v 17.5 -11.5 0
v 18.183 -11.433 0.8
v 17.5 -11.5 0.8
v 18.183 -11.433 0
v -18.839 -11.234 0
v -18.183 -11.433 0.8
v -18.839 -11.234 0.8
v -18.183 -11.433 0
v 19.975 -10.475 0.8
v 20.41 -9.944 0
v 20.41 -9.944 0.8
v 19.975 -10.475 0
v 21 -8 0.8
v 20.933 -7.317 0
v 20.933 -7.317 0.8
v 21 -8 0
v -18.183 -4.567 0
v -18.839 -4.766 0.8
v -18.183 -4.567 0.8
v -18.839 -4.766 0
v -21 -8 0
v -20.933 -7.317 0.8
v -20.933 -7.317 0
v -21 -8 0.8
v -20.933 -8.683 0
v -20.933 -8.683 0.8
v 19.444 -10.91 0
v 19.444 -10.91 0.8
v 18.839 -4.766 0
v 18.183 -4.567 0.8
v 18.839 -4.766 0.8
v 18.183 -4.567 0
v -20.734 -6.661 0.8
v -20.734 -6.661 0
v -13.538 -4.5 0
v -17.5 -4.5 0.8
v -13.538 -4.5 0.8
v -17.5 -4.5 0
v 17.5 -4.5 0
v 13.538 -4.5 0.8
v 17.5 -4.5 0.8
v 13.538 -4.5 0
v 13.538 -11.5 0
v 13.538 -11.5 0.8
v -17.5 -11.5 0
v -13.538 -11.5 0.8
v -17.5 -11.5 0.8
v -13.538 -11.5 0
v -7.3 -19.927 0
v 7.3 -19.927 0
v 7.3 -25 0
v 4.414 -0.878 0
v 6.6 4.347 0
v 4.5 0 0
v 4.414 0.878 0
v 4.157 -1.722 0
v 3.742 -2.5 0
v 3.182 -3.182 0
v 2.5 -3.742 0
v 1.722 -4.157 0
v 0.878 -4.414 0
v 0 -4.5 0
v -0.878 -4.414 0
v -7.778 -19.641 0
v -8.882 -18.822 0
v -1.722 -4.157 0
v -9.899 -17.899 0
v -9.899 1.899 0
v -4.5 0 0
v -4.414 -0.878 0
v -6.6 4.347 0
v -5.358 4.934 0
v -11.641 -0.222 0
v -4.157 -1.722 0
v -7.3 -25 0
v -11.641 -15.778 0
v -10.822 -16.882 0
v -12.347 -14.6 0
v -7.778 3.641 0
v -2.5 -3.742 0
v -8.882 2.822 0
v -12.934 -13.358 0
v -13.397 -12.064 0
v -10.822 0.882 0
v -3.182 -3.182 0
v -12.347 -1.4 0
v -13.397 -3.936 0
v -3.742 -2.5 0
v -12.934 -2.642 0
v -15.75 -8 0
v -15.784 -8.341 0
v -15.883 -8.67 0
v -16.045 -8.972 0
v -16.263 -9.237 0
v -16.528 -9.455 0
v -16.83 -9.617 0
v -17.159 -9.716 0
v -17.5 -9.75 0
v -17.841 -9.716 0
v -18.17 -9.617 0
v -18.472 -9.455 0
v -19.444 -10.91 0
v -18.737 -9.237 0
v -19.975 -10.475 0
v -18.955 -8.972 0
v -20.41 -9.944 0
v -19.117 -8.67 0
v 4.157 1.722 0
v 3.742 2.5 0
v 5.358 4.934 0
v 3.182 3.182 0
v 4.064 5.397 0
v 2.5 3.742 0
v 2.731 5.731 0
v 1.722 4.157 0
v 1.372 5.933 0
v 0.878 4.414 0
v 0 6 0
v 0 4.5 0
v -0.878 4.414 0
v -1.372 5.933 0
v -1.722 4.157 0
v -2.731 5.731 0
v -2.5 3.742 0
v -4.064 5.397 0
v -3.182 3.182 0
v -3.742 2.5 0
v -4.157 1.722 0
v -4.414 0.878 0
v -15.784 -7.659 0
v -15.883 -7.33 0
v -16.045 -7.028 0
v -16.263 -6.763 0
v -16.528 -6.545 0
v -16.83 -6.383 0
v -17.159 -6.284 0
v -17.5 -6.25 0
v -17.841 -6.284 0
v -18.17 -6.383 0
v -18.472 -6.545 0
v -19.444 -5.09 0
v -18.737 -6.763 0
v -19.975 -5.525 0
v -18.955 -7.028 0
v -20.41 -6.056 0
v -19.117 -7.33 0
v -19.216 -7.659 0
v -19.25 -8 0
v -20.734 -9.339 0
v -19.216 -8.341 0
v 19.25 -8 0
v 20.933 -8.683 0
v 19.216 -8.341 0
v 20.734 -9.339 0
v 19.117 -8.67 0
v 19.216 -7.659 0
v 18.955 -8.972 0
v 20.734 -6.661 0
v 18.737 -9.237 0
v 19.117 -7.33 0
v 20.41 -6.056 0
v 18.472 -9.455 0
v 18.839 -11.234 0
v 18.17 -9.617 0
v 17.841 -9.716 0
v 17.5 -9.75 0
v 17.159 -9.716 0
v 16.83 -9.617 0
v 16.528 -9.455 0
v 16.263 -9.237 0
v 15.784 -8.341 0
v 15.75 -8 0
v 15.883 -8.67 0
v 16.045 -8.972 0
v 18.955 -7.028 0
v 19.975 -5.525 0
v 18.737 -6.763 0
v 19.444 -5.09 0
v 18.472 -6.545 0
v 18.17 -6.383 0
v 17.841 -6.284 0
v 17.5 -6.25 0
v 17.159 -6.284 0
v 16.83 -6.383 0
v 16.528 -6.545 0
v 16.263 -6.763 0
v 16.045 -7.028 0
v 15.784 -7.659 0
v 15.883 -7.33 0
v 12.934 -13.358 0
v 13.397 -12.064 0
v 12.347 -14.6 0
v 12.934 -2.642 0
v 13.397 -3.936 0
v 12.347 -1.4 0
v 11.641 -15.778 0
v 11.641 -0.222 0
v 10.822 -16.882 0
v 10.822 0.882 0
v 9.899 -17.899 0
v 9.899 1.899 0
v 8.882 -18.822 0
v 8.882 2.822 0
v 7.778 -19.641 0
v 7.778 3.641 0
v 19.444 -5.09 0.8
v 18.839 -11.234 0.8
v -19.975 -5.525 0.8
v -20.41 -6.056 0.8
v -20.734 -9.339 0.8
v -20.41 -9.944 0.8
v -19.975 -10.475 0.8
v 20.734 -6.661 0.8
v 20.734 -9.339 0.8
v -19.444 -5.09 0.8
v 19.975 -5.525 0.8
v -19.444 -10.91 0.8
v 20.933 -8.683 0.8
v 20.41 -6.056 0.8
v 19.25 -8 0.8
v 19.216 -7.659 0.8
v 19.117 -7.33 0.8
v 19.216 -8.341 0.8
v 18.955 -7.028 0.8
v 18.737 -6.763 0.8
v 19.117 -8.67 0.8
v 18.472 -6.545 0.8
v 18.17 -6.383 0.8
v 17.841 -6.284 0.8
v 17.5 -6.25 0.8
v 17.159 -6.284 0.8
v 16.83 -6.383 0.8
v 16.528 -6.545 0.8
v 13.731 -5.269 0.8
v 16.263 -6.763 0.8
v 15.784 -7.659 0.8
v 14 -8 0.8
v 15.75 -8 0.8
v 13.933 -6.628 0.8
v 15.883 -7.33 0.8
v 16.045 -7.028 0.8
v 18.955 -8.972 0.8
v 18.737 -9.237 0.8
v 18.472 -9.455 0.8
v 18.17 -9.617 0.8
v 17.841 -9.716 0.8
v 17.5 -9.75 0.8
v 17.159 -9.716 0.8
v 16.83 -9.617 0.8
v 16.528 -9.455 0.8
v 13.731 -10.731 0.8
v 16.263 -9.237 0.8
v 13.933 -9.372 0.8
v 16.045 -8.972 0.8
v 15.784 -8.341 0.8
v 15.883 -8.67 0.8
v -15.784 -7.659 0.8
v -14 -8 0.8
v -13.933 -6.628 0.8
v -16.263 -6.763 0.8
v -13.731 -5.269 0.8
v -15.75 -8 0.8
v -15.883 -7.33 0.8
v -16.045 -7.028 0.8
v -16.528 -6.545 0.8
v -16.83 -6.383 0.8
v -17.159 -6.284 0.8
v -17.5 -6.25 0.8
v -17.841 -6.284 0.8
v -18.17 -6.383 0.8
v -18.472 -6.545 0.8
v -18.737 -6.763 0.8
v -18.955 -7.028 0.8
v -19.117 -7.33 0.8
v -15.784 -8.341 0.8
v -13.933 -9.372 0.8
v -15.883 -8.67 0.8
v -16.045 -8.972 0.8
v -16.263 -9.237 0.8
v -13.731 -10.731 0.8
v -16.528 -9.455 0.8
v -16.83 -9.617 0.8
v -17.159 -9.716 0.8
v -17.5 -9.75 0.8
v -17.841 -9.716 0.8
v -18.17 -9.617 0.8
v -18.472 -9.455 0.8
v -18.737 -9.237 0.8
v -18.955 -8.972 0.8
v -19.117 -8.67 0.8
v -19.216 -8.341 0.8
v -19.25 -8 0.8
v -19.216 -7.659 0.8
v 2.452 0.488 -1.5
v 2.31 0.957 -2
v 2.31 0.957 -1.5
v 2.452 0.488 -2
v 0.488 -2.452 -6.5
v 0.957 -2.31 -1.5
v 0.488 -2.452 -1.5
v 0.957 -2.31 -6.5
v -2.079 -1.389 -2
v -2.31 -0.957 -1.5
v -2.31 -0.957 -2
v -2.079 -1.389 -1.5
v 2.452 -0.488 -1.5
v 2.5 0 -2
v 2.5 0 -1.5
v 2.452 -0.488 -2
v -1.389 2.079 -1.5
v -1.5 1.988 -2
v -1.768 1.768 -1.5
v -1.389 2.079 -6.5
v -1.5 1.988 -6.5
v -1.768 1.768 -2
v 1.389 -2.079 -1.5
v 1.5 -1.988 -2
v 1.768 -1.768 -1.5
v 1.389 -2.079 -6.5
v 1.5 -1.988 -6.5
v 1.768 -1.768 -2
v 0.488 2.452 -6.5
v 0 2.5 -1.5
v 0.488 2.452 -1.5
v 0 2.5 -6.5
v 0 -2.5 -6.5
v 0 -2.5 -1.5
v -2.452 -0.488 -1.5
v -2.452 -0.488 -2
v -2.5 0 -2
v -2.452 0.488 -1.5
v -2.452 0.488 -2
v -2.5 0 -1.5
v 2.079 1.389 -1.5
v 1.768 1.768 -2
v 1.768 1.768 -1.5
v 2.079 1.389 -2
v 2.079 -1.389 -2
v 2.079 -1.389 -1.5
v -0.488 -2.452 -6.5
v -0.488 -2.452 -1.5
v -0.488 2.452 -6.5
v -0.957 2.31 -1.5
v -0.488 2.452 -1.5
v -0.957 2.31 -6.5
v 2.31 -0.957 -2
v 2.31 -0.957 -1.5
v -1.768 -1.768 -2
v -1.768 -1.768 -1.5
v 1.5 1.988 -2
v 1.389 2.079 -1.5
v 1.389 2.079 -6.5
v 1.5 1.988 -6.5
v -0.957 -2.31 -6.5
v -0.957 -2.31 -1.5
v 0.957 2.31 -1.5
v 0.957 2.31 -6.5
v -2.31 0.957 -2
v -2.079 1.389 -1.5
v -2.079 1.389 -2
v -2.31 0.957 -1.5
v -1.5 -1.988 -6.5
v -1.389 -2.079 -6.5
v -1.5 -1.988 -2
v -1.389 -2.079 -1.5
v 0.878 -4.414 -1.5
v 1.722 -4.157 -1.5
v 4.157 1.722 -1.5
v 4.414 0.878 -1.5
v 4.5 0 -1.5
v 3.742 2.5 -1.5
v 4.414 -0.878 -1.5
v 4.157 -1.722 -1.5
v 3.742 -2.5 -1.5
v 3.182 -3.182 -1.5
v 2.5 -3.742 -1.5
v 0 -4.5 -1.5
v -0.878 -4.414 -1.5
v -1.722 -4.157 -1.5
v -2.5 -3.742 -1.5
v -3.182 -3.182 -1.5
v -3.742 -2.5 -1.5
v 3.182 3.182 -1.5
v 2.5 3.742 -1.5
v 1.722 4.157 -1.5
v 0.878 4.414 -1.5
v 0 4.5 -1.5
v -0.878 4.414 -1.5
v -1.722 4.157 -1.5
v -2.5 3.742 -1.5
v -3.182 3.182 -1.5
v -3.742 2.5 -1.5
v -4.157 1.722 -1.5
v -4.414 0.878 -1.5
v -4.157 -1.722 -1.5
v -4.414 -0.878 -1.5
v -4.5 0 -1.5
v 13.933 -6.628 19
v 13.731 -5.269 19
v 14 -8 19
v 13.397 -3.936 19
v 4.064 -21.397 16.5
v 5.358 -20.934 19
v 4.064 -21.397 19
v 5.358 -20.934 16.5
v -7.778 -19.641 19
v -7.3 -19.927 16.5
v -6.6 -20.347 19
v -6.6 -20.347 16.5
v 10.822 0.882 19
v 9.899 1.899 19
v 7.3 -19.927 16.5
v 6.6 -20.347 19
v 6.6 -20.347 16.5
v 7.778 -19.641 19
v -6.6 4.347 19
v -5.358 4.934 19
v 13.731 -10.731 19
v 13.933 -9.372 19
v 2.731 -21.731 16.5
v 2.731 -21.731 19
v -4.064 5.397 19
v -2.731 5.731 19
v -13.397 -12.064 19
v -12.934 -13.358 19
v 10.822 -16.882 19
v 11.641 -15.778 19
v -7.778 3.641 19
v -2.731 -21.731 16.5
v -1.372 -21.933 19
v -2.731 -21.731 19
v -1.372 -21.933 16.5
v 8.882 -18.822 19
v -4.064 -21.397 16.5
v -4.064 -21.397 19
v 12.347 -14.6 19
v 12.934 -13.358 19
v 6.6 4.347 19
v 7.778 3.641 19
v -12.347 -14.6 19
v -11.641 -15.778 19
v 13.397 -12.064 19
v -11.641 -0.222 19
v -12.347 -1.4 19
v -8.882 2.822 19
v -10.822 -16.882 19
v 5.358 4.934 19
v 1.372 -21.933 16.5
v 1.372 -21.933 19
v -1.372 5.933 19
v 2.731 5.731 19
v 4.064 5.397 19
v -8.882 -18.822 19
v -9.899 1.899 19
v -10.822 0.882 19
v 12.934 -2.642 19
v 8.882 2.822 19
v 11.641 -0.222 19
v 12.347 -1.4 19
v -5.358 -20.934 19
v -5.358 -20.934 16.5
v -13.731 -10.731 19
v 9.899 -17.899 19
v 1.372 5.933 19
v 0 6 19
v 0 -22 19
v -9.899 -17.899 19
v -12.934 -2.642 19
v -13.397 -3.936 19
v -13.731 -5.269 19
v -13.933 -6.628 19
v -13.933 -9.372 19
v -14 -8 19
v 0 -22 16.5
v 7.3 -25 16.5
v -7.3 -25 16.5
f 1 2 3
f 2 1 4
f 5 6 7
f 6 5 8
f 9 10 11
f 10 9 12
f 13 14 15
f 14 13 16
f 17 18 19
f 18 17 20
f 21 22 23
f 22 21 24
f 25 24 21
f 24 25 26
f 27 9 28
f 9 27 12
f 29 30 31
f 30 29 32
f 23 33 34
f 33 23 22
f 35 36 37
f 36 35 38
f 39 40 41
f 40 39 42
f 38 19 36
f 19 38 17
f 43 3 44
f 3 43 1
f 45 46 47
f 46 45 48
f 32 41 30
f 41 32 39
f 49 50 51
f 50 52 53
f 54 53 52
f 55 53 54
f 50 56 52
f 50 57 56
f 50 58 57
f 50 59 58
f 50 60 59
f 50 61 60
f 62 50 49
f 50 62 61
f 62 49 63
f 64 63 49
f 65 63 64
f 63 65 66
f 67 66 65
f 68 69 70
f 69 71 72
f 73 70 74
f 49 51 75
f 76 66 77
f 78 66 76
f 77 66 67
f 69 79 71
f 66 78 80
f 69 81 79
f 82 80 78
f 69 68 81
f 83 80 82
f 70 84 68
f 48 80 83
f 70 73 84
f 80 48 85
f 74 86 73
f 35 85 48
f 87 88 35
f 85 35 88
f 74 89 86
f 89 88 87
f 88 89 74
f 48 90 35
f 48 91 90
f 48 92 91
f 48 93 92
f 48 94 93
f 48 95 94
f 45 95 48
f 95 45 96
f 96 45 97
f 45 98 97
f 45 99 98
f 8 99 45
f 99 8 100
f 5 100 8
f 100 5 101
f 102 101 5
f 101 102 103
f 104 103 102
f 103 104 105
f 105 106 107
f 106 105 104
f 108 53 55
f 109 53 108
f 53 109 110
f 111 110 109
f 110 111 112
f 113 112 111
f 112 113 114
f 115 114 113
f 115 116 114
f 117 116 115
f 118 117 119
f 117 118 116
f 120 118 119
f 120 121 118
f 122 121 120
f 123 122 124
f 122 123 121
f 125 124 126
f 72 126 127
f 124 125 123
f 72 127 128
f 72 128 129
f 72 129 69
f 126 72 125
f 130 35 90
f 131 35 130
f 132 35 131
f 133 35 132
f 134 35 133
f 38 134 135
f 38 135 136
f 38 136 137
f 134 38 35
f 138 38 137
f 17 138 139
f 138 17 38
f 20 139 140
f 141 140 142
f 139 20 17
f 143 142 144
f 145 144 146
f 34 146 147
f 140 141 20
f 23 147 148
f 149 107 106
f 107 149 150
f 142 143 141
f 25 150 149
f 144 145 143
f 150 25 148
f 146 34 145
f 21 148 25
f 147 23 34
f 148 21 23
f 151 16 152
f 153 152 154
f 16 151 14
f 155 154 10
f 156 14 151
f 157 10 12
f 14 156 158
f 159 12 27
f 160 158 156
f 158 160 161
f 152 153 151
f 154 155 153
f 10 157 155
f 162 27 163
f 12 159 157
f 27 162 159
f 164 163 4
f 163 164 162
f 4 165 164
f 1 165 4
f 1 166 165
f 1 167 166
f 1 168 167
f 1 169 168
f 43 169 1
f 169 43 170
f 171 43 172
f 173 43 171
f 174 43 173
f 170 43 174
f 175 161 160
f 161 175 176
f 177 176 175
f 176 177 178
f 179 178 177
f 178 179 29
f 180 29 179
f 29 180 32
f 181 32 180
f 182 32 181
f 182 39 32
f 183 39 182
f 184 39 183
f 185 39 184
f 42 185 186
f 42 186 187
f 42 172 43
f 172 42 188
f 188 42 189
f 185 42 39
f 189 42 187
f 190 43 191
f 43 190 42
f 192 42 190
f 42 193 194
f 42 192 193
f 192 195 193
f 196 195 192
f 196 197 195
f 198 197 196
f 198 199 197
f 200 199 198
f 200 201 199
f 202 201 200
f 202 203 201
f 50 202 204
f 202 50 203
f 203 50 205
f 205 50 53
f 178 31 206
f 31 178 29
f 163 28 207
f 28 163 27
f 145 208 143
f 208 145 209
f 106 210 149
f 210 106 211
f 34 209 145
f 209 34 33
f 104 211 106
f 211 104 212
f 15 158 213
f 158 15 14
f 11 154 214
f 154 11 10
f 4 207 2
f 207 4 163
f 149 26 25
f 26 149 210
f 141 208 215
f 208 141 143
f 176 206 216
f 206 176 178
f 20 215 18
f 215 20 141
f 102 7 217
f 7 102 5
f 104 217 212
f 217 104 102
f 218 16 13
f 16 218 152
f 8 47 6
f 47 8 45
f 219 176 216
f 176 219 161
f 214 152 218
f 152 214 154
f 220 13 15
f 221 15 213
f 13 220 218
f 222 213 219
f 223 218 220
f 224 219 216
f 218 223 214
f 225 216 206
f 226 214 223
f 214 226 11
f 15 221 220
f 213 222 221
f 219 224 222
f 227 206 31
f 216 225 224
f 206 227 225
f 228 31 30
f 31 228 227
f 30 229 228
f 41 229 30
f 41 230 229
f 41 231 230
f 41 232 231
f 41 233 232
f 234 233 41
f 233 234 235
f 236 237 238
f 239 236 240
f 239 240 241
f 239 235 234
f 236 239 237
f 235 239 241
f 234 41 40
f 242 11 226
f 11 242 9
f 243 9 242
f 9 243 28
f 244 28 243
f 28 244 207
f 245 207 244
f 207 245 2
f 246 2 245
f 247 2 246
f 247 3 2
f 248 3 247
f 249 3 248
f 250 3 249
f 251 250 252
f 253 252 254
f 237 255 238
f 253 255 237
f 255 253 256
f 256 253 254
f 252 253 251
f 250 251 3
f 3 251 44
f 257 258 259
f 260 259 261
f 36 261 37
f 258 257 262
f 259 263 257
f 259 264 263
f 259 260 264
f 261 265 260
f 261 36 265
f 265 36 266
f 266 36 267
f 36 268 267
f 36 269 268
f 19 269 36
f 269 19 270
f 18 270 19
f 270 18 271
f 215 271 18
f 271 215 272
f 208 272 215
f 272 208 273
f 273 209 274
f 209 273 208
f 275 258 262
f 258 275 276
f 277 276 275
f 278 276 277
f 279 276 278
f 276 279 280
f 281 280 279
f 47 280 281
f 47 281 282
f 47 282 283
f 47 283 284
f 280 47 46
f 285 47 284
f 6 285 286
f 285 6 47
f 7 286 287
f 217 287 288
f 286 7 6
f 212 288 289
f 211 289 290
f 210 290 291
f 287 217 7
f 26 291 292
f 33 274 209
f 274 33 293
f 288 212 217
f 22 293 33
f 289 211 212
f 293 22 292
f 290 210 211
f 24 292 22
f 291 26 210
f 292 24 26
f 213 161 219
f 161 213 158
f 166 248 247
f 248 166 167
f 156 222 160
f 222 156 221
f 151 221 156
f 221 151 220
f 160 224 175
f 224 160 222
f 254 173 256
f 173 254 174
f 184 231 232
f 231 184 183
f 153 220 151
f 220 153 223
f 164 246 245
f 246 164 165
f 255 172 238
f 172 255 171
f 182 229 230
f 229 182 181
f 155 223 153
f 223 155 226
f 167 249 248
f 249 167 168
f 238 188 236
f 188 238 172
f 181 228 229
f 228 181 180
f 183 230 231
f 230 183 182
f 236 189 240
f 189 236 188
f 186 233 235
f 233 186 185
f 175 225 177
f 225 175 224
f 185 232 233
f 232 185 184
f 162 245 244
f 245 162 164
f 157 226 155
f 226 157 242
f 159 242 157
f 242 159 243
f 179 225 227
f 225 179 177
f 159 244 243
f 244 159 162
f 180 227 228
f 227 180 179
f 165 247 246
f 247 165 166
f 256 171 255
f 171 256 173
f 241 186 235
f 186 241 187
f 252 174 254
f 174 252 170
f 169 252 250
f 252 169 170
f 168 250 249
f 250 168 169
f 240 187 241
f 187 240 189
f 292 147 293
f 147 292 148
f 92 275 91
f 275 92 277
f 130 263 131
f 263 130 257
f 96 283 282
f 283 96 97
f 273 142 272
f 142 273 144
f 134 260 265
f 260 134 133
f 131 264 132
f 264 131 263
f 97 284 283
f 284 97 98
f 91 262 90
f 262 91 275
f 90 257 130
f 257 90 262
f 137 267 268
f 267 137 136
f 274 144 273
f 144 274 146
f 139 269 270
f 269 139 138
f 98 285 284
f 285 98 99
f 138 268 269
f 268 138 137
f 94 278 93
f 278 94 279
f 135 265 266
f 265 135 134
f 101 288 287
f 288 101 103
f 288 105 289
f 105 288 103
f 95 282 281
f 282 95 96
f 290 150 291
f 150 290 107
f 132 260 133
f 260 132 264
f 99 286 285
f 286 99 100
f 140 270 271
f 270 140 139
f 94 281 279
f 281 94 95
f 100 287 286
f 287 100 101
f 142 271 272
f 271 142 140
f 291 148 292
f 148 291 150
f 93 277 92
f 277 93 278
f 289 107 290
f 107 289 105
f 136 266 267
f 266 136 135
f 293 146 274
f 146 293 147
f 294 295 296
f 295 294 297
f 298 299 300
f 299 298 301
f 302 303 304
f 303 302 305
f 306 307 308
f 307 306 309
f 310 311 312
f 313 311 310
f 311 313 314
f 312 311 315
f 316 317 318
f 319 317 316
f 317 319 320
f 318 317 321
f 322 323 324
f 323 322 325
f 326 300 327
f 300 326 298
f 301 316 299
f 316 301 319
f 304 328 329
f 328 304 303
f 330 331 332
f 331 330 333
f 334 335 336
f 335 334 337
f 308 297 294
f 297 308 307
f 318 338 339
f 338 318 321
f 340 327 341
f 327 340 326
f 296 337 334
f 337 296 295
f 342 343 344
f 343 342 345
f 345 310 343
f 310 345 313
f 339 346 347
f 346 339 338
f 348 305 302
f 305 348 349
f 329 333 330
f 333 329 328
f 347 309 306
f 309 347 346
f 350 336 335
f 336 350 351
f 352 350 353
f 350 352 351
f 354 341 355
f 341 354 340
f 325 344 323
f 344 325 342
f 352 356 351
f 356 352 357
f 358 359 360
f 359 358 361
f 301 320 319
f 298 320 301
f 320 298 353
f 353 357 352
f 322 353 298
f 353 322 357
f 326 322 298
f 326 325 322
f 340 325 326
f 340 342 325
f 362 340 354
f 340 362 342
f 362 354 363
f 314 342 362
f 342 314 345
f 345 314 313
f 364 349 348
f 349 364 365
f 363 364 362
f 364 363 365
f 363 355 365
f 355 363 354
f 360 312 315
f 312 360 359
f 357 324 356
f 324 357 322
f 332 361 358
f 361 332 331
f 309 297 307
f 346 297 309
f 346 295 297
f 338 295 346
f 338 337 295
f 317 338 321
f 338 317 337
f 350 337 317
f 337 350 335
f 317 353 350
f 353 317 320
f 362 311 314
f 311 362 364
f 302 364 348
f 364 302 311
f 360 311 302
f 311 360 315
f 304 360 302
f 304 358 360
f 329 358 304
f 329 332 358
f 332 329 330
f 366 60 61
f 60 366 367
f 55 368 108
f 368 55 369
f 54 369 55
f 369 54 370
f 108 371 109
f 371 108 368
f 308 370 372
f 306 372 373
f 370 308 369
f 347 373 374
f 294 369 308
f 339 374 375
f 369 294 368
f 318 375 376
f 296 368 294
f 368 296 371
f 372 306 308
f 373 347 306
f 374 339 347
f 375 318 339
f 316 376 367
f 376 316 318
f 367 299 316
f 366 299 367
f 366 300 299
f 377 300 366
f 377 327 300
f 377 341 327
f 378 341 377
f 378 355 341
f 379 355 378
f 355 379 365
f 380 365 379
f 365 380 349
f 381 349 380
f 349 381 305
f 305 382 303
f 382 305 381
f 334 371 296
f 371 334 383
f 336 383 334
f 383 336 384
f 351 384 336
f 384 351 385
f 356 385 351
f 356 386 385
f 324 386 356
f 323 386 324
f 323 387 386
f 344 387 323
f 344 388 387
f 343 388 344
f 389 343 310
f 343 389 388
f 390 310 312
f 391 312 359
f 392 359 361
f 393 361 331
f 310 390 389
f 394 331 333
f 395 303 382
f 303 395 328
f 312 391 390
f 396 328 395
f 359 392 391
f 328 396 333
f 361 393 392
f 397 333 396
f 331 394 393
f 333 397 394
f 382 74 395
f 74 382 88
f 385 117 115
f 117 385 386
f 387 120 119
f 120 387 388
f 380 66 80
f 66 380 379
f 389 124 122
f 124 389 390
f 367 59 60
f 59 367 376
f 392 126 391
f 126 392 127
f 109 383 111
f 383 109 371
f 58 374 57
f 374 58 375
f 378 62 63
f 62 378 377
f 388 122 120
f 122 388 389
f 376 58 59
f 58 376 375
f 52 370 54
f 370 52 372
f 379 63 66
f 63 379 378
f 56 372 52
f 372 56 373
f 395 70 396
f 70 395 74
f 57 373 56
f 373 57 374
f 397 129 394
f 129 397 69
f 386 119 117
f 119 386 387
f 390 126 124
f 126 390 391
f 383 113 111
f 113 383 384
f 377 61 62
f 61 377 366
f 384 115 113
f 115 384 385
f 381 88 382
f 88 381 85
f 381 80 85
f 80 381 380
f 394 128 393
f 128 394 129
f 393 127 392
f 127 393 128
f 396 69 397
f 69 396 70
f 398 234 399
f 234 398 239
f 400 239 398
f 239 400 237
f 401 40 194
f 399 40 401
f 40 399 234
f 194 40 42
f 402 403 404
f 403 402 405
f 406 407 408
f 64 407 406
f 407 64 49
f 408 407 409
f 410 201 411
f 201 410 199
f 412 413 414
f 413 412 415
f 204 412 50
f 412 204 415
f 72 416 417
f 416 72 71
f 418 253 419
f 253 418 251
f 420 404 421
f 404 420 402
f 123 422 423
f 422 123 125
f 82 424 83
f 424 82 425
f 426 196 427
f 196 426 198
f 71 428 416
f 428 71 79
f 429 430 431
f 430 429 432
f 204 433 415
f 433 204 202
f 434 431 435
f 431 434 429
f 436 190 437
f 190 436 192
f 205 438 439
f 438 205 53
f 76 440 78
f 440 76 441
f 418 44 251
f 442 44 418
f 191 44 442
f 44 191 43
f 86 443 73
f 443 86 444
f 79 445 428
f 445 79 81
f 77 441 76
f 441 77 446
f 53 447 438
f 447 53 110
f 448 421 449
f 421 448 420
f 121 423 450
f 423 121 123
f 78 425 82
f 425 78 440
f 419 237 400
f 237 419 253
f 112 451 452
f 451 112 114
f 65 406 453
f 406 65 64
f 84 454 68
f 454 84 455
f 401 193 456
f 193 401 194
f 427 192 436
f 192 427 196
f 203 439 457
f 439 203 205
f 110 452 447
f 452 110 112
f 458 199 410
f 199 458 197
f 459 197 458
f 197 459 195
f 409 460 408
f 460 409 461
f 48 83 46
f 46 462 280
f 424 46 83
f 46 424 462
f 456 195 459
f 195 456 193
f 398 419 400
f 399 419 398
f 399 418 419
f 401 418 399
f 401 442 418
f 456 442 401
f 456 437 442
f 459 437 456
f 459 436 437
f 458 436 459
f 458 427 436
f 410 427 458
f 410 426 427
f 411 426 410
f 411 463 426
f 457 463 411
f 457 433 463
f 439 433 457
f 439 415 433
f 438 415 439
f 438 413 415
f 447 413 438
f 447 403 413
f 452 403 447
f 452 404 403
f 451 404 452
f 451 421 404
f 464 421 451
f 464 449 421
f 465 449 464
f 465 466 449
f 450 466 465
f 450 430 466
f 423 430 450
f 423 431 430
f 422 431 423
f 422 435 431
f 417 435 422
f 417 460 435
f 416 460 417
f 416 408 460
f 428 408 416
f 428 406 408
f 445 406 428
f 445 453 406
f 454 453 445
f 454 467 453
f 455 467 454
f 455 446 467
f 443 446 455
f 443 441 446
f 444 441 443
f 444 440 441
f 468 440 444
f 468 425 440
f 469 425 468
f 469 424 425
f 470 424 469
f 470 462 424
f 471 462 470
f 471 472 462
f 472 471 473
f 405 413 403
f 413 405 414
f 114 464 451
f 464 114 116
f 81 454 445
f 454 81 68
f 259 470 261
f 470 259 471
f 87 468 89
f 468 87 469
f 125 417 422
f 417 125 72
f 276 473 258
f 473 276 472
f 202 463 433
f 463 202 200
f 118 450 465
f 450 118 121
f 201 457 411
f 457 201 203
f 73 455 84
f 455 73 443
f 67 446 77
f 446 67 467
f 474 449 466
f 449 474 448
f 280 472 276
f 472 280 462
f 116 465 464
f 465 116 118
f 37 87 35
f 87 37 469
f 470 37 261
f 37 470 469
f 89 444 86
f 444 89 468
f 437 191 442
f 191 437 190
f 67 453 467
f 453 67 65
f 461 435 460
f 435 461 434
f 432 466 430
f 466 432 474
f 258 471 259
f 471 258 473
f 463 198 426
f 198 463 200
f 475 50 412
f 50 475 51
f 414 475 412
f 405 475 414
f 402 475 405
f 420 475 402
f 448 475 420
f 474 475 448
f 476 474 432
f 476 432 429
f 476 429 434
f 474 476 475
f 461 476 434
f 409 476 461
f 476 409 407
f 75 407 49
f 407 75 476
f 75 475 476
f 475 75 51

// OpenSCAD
// downloaded from: htps://www.thingiverse.com/thing:4031757/files
// modified a bit
//
//  28byj-48 stepper motor from datasheet and measurements
//  Russ Hughes, russ@owt.com
//  Attribution 4.0 International (CC BY 4.0)
//

module stepper_28byj48(segments=32) {
	translate(-[0,8,0])
	stepper_28byj48_0(segments);
}

module stepper_28byj48_shaft(off) {
    difference() {
        cylinder(d=5+off, h=10+off);

        // shaft cutouts
        translate([1.5+off,-2.5,-0.1])
            cube([2,5,4.5+0.1]);

        translate([-2-1.5-off,-2.5,-0.1])
            cube([2,5,4.5+0.1]);
    }
}

module stepper_28byj48_0(segments=32) {
    $fn = segments;
    module mount_tabs() {
        difference() {
            hull() {
                translate([35/2,0,0])
                    cylinder(d=7, 0.8);

                translate([-35/2,0,0])
                    cylinder(d=7, 0.8);
            }
            translate([35/2,0,-0.1])
                cylinder(d=3.5, 0.8+0.2);

            translate([-35/2,0,-0.1])
                cylinder(d=3.5, 0.8+0.2);
        }
    }

    // main body
    color("Silver")
        cylinder(d=28, h =19, $fn=$fn*2);

    // wire cover
    color("DeepSkyBlue")
        translate([-14.6/2,-17,0])
            cube([14.6,5.8, 16.5]);

    color("Silver")
        mount_tabs();

    // shaft and flange
    translate([0,0,-1.5]) {
        // flange
        translate([0,8,0])
            color("Silver")
                cylinder(d=9,h =1.5);

        color("Goldenrod") {
            // shaft
            translate([0,8,-5]) {
                stepper_28byj48_shaft(0);
            }
        }
    }
}

stepper_28byj48();
